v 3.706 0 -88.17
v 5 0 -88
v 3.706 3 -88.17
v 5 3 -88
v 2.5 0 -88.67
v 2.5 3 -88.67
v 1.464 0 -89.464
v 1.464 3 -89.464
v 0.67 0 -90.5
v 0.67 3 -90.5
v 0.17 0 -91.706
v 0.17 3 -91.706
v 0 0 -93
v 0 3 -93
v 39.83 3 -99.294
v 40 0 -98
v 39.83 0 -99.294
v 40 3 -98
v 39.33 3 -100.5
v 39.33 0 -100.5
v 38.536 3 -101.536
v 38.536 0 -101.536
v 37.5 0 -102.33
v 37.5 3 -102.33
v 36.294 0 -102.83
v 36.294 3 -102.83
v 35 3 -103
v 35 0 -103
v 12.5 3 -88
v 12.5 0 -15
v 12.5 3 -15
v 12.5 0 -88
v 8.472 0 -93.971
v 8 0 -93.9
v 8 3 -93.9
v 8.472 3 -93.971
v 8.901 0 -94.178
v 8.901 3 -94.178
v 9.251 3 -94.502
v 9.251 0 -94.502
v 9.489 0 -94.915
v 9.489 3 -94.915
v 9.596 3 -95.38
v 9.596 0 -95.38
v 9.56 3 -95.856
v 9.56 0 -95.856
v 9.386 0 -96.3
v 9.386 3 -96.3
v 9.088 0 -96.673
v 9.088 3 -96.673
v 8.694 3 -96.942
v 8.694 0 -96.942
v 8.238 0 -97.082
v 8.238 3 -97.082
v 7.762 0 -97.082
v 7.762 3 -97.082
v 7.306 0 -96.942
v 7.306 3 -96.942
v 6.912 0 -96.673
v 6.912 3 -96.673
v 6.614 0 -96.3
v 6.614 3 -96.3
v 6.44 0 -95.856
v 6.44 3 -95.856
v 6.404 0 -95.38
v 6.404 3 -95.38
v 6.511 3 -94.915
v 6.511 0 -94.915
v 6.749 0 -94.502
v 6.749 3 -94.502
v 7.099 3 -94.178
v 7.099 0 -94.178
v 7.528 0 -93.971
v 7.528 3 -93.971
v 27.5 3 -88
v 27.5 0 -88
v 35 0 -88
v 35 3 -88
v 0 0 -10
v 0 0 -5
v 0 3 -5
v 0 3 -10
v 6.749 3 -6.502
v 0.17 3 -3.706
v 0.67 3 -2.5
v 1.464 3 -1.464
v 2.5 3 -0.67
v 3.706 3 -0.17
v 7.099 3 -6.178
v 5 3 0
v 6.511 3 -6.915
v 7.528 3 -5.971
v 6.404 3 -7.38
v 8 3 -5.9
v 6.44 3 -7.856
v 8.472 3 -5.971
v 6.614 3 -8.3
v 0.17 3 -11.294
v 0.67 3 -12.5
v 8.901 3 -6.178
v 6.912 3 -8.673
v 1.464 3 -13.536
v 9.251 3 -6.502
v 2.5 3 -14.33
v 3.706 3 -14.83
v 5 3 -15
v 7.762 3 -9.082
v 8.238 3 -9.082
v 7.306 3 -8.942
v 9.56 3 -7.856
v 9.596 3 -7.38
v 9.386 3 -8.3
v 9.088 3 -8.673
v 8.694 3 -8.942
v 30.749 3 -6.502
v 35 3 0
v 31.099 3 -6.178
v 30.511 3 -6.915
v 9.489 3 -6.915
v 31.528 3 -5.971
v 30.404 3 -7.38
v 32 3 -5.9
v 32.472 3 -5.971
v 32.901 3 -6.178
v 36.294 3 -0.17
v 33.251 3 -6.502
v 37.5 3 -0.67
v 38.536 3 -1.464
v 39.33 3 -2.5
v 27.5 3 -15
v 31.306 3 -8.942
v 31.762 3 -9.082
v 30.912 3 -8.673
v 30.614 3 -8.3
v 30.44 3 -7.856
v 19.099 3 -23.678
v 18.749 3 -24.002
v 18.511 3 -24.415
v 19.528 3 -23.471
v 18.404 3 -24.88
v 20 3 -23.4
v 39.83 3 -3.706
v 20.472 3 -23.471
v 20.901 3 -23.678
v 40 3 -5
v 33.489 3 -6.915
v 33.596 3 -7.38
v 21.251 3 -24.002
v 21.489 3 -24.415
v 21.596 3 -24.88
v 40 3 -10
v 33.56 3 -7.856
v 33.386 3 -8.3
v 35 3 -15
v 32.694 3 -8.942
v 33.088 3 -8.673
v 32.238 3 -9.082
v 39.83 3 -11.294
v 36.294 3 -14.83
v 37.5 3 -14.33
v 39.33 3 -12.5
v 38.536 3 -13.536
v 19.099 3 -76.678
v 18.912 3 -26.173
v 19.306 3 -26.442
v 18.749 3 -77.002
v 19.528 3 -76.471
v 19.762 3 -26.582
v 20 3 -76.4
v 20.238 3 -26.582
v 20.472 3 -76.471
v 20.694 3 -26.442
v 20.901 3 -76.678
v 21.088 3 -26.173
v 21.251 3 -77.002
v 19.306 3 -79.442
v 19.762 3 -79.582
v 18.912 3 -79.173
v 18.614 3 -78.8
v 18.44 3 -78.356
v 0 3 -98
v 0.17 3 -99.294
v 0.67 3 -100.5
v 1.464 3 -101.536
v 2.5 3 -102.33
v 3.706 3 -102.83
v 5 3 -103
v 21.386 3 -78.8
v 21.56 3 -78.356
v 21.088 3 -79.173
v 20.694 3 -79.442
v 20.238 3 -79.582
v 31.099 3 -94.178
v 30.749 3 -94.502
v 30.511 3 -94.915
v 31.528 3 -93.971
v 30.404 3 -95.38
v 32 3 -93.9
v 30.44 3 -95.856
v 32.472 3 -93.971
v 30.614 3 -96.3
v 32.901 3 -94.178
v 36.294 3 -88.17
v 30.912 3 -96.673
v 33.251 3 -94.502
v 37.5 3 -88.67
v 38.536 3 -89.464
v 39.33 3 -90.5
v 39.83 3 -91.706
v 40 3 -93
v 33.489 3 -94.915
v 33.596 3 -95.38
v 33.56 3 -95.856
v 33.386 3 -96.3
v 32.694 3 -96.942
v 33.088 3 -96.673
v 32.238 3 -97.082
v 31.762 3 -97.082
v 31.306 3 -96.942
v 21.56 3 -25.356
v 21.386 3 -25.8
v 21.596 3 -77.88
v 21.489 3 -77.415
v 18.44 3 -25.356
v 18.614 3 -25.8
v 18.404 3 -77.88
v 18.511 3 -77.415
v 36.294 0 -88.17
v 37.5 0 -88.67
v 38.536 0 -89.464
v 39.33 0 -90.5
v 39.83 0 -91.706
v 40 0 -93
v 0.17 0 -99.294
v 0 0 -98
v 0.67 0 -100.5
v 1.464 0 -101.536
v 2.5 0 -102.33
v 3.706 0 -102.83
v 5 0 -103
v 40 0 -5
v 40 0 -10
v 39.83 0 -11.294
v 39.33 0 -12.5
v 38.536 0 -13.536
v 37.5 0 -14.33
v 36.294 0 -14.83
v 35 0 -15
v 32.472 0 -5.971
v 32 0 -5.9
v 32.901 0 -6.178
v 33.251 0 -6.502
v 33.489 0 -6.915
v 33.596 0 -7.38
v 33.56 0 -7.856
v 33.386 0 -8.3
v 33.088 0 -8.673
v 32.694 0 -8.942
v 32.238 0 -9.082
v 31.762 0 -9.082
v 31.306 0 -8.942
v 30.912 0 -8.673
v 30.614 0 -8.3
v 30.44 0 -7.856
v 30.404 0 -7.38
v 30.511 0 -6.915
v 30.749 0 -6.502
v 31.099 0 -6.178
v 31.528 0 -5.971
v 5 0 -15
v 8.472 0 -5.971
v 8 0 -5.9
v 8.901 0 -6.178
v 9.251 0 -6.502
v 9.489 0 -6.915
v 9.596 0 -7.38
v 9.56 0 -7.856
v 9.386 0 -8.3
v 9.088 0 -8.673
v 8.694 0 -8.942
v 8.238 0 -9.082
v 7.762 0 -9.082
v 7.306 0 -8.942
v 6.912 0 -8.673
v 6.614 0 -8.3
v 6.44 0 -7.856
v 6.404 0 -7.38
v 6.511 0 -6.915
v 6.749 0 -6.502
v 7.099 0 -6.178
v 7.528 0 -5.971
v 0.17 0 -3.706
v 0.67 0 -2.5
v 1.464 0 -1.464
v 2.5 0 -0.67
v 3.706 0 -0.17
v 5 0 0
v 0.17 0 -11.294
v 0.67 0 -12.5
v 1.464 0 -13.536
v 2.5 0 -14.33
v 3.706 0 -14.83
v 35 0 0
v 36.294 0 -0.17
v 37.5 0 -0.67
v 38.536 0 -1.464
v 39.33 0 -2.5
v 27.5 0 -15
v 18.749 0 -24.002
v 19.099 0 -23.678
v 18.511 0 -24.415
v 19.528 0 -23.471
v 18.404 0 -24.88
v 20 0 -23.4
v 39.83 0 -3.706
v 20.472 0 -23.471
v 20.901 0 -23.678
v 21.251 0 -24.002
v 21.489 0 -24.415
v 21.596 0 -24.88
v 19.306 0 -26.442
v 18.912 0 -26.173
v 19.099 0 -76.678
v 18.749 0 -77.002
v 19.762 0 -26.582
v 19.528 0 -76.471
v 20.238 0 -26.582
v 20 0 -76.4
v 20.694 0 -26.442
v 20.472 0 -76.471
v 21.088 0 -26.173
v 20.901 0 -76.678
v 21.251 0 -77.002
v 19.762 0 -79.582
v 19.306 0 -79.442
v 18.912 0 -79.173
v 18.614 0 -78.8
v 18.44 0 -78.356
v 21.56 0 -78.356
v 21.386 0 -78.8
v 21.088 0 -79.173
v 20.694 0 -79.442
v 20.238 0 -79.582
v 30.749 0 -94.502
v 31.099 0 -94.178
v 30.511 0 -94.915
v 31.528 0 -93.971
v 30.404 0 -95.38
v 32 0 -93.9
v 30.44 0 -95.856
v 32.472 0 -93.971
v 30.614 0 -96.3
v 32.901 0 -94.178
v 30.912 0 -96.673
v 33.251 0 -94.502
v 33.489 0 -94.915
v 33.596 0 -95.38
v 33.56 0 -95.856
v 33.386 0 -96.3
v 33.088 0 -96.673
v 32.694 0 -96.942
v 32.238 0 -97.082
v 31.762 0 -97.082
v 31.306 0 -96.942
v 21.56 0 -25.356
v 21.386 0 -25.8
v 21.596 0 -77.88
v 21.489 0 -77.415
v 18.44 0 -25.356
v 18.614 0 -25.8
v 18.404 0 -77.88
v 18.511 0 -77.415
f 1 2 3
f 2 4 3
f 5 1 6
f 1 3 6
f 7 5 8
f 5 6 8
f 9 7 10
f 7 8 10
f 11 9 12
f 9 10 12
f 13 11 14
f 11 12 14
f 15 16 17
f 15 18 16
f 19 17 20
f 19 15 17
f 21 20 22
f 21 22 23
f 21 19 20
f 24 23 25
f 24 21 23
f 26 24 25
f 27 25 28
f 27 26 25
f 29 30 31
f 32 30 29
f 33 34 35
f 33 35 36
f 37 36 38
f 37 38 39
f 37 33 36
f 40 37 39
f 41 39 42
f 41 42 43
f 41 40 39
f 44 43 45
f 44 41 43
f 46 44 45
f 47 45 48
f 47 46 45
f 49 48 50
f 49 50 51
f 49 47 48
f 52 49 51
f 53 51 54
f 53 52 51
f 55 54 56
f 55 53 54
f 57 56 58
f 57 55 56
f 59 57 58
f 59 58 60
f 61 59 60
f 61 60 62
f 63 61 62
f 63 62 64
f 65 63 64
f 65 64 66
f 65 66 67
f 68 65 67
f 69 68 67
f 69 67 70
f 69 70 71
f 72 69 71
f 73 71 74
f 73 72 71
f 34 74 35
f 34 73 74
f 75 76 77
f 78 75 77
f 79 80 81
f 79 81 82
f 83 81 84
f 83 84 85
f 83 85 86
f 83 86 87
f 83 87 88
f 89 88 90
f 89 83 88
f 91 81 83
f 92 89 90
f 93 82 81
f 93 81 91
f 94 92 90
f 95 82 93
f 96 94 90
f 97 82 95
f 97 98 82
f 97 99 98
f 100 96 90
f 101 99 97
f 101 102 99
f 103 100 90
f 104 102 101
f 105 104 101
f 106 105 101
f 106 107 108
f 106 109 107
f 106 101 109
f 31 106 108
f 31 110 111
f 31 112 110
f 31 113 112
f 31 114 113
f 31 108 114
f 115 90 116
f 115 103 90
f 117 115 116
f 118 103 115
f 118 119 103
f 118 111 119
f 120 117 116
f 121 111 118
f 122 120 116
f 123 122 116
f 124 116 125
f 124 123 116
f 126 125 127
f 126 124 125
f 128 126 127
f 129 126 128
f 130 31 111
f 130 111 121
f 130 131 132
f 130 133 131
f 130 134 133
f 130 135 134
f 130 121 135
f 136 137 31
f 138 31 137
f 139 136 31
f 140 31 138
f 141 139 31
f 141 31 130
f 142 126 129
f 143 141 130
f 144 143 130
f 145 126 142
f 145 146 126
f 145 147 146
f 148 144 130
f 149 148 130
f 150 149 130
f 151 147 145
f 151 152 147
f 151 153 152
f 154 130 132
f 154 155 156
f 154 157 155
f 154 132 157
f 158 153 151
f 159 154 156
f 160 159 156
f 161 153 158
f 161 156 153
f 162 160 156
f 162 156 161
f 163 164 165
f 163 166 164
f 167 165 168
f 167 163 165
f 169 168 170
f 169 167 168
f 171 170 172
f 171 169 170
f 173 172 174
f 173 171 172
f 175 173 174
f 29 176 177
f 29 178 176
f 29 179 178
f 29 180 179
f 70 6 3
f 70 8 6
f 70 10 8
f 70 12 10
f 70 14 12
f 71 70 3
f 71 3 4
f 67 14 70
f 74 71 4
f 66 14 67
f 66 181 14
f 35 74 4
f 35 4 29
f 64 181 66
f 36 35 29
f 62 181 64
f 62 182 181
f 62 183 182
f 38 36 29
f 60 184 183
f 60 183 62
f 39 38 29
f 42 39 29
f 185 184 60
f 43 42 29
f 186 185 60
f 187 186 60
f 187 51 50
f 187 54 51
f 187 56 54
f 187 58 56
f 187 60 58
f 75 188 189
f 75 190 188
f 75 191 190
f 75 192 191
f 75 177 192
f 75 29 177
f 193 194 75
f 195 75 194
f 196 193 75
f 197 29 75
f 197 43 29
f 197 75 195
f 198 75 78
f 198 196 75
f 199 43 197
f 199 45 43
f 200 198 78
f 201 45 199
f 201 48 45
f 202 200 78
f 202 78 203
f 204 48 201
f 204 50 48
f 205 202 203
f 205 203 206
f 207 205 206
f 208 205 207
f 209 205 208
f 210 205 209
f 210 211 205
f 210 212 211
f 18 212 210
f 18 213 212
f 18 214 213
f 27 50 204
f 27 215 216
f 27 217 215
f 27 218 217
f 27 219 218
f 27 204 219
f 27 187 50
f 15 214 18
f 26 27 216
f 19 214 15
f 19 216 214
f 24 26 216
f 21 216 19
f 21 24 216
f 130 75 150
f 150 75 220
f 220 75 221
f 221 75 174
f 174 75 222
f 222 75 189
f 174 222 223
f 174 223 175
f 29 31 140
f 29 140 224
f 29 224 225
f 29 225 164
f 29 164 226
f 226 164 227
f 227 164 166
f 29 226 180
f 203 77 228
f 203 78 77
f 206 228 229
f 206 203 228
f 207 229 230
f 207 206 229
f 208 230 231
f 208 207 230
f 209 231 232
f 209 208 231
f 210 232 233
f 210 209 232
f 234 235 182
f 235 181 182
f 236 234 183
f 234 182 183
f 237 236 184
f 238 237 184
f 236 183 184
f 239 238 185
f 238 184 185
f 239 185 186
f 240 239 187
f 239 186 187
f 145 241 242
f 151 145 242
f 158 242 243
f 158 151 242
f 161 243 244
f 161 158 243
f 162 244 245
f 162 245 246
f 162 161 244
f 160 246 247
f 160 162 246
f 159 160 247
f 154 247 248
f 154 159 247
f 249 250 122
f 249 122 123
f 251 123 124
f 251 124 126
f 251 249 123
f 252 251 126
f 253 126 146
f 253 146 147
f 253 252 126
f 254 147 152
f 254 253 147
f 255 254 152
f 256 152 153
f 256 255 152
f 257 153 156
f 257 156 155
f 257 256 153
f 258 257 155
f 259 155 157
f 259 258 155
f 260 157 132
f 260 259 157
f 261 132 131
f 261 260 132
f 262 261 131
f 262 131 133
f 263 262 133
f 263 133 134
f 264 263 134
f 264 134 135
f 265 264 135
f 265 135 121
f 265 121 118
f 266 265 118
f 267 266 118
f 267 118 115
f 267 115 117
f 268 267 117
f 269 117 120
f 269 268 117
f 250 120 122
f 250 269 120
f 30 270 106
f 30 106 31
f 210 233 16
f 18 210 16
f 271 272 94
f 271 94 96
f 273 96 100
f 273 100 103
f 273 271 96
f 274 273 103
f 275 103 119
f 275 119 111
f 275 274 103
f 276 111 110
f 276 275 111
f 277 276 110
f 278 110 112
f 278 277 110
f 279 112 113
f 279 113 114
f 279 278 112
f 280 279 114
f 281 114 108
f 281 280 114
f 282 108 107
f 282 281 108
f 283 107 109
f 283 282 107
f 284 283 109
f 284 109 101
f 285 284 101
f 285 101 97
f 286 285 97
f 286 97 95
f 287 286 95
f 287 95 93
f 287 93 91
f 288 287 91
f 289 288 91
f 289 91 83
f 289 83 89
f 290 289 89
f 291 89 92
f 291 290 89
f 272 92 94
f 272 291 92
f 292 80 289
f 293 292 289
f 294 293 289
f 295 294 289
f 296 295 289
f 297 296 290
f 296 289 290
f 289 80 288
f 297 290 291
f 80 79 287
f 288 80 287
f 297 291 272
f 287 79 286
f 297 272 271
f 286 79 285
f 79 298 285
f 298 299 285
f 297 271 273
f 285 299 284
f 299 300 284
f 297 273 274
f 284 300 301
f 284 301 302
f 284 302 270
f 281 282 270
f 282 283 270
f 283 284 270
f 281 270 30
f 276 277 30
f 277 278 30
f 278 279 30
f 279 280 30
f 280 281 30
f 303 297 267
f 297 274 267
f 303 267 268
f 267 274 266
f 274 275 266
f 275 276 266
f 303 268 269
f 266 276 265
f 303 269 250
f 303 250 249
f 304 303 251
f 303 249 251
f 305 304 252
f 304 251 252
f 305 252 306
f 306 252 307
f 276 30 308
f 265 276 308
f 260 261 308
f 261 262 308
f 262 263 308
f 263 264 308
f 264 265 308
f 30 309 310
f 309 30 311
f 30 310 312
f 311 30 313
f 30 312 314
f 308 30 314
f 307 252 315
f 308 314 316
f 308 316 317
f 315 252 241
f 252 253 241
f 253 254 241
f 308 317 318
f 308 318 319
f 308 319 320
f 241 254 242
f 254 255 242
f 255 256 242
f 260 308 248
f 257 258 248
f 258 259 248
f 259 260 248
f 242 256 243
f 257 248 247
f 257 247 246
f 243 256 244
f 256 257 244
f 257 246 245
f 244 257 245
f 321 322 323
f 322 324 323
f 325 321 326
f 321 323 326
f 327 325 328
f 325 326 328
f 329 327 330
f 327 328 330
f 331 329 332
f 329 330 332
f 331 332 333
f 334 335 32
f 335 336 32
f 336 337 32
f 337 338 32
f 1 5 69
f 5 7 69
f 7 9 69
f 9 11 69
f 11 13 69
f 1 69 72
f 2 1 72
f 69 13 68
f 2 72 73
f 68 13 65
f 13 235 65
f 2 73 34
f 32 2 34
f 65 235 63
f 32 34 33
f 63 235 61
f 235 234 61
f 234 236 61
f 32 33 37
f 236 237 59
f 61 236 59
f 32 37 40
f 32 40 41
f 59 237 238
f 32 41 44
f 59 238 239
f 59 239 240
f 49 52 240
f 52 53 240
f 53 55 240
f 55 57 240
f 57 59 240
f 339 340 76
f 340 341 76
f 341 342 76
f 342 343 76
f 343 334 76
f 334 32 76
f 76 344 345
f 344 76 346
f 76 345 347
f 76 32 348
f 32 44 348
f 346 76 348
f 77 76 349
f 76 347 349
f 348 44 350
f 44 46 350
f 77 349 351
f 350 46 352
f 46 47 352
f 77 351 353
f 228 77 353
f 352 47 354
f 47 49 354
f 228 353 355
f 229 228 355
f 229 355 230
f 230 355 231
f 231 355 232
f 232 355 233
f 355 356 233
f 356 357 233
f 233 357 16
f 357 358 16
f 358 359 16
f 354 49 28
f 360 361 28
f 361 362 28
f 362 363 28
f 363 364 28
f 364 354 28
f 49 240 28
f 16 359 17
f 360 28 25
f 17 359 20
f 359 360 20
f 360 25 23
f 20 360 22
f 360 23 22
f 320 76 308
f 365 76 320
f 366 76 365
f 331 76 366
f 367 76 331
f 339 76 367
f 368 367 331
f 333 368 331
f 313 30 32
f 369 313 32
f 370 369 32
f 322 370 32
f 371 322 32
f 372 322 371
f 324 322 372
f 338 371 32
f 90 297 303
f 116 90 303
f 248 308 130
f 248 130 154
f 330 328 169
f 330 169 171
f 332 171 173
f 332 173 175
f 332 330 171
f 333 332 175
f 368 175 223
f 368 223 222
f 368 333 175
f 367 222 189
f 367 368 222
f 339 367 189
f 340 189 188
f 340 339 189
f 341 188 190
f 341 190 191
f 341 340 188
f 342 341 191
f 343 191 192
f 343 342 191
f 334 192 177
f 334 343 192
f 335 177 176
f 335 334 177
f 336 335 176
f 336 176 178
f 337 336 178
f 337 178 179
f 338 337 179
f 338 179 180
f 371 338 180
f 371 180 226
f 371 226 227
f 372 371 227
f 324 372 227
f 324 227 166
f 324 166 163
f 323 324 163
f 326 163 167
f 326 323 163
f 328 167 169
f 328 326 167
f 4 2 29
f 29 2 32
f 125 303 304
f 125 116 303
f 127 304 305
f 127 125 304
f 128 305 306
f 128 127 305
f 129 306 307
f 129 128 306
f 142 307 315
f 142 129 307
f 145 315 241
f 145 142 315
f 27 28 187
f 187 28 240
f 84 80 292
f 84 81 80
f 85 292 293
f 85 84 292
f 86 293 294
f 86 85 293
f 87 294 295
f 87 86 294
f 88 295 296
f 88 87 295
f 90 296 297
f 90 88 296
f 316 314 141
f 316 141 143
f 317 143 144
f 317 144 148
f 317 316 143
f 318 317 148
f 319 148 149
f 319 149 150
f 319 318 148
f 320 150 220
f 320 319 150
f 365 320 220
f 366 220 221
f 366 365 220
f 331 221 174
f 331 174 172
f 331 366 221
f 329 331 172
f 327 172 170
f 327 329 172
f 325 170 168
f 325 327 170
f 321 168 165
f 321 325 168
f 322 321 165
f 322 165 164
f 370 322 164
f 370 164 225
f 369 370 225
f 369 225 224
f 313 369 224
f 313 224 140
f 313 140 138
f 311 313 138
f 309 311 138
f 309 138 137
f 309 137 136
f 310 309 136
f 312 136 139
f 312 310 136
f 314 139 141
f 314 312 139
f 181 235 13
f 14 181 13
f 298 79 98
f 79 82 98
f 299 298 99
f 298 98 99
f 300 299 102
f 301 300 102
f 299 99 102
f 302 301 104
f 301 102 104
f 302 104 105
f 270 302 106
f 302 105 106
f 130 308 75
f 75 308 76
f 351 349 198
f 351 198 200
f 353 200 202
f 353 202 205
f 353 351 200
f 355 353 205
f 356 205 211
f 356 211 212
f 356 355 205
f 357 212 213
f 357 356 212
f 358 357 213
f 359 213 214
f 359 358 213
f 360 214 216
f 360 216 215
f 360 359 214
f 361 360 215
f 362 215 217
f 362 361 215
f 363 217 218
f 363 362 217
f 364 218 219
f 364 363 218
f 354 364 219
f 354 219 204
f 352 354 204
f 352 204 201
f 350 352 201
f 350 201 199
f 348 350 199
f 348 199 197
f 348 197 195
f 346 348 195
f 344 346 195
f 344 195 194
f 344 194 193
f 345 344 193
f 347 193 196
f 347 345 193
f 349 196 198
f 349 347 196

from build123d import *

# Parameters (mm, degrees)
SKETCH1_R           = 1.6
SKETCH1_W           = 15
SKETCH1_H           = 73
SKETCH1_W_2         = 40
SKETCH1_H_2         = 15
BOSS_EXTRUDE1_DEPTH = 3
FILLET1_R           = 5


with BuildPart() as part:
    # Sketch1 → Boss-Extrude1 (new body)
    # profile 1 of 3: a face of its own
    with BuildSketch(Plane(origin=(0, 0, 0), x_dir=(1, 0, 0), z_dir=(0, 1, 0))):
        Polygon((0, 88), (12.5, 88), (27.5, 88), (40, 88), (40, 103), (0, 103), align=None)
        with Locations(Location((8, 95.5, 0), (0, 0, 270))):
            Circle(SKETCH1_R, mode=Mode.SUBTRACT)
        with Locations(Location((32, 95.5, 0), (0, 0, 270))):
            Circle(SKETCH1_R, mode=Mode.SUBTRACT)
    # profile 2 of 3: a face of its own
    with BuildSketch(Plane(origin=(0, 0, 0), x_dir=(1, 0, 0), z_dir=(0, 1, 0))):
        with Locations((20, 51.5)):
            Rectangle(SKETCH1_W, SKETCH1_H)
        with Locations(Location((20, 25, 0), (0, 0, 270))):
            Circle(SKETCH1_R, mode=Mode.SUBTRACT)
        with Locations(Location((20, 78, 0), (0, 0, 270))):
            Circle(SKETCH1_R, mode=Mode.SUBTRACT)
    # profile 3 of 3: a face of its own
    with BuildSketch(Plane(origin=(0, 0, 0), x_dir=(1, 0, 0), z_dir=(0, 1, 0))):
        with Locations((20, 7.5)):
            Rectangle(SKETCH1_W_2, SKETCH1_H_2)
        with Locations(Location((8, 7.5, 0), (0, 0, 270))):
            Circle(SKETCH1_R, mode=Mode.SUBTRACT)
        with Locations(Location((32, 7.5, 0), (0, 0, 270))):
            Circle(SKETCH1_R, mode=Mode.SUBTRACT)
    extrude(amount=BOSS_EXTRUDE1_DEPTH)

    # Fillet1
    fillet1_edges = [part.edges().sort_by_distance(p)[0] for p in [
        (40, 1.5, -88),
        (40, 1.5, -15),
        (40, 1.5, 0),
        (0, 1.5, 0),
        (0, 1.5, -15),
        (0, 1.5, -88),
        (0, 1.5, -103),
        (40, 1.5, -103),
    ]]
    fillet(fillet1_edges, radius=FILLET1_R)


solid = part.part
